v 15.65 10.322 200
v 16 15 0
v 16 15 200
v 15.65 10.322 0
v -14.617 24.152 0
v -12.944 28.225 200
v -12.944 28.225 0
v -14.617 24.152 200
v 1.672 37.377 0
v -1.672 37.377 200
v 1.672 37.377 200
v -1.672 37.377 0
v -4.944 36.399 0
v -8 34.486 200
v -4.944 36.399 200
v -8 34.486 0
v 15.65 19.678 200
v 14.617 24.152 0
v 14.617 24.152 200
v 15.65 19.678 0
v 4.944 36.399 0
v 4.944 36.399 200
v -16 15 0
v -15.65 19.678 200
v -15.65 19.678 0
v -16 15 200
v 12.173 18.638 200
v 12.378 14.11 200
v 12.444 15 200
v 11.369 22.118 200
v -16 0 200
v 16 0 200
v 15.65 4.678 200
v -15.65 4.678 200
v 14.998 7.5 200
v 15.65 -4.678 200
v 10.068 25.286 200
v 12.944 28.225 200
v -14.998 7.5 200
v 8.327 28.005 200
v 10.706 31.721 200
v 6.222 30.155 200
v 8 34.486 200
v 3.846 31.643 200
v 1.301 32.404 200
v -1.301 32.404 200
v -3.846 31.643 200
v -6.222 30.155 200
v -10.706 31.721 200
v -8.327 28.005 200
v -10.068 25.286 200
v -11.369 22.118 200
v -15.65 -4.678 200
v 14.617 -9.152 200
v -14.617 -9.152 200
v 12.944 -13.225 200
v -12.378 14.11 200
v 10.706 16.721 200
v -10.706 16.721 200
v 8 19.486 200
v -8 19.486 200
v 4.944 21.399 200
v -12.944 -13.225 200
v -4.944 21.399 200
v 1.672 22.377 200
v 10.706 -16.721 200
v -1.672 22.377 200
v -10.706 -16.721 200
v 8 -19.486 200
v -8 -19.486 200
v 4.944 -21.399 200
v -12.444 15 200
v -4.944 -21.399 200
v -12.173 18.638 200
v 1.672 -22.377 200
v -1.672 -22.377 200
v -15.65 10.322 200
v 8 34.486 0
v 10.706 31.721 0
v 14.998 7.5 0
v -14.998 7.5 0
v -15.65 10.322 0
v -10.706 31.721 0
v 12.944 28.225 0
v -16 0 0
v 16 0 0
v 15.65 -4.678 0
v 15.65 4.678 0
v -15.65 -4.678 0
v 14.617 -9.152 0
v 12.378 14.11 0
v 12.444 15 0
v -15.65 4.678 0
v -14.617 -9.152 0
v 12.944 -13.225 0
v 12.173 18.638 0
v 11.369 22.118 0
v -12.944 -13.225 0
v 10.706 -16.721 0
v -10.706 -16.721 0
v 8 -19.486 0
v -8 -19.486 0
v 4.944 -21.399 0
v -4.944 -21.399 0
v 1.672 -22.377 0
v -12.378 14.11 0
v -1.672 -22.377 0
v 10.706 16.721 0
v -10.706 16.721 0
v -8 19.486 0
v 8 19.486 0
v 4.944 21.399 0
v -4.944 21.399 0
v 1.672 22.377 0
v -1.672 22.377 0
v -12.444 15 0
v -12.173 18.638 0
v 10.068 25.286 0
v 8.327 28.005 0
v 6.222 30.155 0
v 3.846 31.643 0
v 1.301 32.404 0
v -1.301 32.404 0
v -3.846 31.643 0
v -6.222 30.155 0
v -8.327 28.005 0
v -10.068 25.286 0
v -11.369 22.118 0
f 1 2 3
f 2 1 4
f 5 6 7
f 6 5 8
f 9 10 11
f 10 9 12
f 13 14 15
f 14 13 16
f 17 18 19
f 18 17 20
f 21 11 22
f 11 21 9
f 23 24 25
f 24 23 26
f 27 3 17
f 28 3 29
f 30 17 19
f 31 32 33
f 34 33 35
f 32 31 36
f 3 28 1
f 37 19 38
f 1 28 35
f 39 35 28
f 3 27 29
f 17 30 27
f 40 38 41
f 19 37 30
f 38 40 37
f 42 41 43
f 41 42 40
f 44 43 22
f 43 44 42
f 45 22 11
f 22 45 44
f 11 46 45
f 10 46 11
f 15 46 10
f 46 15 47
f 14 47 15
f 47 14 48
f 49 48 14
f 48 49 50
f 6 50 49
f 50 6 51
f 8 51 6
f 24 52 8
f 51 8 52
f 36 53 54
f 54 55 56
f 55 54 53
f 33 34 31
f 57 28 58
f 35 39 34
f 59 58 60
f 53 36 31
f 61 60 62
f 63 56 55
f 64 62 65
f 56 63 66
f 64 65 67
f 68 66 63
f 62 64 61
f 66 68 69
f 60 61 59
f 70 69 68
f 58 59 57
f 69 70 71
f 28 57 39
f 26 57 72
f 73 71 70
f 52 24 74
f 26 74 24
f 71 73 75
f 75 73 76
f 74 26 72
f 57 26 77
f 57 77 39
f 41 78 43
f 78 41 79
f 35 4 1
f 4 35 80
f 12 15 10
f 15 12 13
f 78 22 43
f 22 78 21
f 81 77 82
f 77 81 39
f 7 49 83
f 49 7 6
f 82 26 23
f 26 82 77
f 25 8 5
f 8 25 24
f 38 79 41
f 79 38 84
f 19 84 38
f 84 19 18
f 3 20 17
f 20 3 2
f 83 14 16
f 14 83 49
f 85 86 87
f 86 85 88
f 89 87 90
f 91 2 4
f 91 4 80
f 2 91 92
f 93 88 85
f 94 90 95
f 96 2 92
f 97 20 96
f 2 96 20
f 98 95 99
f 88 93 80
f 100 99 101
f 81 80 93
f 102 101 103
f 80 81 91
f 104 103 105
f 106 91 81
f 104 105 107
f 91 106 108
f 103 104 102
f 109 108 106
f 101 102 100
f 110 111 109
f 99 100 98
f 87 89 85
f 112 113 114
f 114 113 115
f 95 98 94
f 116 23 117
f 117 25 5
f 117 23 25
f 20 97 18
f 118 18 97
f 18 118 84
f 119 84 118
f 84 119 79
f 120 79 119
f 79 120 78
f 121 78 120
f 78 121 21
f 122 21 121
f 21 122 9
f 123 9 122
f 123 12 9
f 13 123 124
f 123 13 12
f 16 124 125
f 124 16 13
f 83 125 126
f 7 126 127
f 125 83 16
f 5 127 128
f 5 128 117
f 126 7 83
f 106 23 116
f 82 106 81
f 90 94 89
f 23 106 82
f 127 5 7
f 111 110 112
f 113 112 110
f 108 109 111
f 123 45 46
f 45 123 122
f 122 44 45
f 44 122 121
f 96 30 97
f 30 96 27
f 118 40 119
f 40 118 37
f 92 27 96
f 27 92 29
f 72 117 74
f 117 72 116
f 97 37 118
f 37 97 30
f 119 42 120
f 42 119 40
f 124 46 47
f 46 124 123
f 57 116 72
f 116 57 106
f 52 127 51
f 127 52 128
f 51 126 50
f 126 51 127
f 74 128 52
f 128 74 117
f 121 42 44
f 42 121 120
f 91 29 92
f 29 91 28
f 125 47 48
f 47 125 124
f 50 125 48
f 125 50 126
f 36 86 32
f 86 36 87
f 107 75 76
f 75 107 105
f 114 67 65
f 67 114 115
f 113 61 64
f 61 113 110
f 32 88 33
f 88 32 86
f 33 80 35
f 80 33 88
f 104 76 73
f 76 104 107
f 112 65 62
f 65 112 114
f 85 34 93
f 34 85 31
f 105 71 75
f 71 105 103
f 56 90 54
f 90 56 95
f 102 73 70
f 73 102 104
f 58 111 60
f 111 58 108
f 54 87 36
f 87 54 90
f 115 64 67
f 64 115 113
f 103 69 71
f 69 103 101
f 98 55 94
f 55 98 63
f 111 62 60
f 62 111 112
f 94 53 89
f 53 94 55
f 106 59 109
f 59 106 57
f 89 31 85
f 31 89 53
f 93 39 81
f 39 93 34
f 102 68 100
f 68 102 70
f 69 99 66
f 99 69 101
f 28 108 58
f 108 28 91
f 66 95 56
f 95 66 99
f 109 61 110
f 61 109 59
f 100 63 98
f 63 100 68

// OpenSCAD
linear_extrude(height = 200)
scale([32/45, 1,1])
circle(d=45);

color([1,0,0]);
#cylinder(r1=10,r2=10, h=20);


difference () {
    translate([0,15,0])
    linear_extrude(height = 200)
    scale([32/45, 1,1])
    circle(d=45);
    
    translate([0,15,-20])
    linear_extrude(height = 250)
    scale([32/45, 1,1])
    circle(d=35);
}
